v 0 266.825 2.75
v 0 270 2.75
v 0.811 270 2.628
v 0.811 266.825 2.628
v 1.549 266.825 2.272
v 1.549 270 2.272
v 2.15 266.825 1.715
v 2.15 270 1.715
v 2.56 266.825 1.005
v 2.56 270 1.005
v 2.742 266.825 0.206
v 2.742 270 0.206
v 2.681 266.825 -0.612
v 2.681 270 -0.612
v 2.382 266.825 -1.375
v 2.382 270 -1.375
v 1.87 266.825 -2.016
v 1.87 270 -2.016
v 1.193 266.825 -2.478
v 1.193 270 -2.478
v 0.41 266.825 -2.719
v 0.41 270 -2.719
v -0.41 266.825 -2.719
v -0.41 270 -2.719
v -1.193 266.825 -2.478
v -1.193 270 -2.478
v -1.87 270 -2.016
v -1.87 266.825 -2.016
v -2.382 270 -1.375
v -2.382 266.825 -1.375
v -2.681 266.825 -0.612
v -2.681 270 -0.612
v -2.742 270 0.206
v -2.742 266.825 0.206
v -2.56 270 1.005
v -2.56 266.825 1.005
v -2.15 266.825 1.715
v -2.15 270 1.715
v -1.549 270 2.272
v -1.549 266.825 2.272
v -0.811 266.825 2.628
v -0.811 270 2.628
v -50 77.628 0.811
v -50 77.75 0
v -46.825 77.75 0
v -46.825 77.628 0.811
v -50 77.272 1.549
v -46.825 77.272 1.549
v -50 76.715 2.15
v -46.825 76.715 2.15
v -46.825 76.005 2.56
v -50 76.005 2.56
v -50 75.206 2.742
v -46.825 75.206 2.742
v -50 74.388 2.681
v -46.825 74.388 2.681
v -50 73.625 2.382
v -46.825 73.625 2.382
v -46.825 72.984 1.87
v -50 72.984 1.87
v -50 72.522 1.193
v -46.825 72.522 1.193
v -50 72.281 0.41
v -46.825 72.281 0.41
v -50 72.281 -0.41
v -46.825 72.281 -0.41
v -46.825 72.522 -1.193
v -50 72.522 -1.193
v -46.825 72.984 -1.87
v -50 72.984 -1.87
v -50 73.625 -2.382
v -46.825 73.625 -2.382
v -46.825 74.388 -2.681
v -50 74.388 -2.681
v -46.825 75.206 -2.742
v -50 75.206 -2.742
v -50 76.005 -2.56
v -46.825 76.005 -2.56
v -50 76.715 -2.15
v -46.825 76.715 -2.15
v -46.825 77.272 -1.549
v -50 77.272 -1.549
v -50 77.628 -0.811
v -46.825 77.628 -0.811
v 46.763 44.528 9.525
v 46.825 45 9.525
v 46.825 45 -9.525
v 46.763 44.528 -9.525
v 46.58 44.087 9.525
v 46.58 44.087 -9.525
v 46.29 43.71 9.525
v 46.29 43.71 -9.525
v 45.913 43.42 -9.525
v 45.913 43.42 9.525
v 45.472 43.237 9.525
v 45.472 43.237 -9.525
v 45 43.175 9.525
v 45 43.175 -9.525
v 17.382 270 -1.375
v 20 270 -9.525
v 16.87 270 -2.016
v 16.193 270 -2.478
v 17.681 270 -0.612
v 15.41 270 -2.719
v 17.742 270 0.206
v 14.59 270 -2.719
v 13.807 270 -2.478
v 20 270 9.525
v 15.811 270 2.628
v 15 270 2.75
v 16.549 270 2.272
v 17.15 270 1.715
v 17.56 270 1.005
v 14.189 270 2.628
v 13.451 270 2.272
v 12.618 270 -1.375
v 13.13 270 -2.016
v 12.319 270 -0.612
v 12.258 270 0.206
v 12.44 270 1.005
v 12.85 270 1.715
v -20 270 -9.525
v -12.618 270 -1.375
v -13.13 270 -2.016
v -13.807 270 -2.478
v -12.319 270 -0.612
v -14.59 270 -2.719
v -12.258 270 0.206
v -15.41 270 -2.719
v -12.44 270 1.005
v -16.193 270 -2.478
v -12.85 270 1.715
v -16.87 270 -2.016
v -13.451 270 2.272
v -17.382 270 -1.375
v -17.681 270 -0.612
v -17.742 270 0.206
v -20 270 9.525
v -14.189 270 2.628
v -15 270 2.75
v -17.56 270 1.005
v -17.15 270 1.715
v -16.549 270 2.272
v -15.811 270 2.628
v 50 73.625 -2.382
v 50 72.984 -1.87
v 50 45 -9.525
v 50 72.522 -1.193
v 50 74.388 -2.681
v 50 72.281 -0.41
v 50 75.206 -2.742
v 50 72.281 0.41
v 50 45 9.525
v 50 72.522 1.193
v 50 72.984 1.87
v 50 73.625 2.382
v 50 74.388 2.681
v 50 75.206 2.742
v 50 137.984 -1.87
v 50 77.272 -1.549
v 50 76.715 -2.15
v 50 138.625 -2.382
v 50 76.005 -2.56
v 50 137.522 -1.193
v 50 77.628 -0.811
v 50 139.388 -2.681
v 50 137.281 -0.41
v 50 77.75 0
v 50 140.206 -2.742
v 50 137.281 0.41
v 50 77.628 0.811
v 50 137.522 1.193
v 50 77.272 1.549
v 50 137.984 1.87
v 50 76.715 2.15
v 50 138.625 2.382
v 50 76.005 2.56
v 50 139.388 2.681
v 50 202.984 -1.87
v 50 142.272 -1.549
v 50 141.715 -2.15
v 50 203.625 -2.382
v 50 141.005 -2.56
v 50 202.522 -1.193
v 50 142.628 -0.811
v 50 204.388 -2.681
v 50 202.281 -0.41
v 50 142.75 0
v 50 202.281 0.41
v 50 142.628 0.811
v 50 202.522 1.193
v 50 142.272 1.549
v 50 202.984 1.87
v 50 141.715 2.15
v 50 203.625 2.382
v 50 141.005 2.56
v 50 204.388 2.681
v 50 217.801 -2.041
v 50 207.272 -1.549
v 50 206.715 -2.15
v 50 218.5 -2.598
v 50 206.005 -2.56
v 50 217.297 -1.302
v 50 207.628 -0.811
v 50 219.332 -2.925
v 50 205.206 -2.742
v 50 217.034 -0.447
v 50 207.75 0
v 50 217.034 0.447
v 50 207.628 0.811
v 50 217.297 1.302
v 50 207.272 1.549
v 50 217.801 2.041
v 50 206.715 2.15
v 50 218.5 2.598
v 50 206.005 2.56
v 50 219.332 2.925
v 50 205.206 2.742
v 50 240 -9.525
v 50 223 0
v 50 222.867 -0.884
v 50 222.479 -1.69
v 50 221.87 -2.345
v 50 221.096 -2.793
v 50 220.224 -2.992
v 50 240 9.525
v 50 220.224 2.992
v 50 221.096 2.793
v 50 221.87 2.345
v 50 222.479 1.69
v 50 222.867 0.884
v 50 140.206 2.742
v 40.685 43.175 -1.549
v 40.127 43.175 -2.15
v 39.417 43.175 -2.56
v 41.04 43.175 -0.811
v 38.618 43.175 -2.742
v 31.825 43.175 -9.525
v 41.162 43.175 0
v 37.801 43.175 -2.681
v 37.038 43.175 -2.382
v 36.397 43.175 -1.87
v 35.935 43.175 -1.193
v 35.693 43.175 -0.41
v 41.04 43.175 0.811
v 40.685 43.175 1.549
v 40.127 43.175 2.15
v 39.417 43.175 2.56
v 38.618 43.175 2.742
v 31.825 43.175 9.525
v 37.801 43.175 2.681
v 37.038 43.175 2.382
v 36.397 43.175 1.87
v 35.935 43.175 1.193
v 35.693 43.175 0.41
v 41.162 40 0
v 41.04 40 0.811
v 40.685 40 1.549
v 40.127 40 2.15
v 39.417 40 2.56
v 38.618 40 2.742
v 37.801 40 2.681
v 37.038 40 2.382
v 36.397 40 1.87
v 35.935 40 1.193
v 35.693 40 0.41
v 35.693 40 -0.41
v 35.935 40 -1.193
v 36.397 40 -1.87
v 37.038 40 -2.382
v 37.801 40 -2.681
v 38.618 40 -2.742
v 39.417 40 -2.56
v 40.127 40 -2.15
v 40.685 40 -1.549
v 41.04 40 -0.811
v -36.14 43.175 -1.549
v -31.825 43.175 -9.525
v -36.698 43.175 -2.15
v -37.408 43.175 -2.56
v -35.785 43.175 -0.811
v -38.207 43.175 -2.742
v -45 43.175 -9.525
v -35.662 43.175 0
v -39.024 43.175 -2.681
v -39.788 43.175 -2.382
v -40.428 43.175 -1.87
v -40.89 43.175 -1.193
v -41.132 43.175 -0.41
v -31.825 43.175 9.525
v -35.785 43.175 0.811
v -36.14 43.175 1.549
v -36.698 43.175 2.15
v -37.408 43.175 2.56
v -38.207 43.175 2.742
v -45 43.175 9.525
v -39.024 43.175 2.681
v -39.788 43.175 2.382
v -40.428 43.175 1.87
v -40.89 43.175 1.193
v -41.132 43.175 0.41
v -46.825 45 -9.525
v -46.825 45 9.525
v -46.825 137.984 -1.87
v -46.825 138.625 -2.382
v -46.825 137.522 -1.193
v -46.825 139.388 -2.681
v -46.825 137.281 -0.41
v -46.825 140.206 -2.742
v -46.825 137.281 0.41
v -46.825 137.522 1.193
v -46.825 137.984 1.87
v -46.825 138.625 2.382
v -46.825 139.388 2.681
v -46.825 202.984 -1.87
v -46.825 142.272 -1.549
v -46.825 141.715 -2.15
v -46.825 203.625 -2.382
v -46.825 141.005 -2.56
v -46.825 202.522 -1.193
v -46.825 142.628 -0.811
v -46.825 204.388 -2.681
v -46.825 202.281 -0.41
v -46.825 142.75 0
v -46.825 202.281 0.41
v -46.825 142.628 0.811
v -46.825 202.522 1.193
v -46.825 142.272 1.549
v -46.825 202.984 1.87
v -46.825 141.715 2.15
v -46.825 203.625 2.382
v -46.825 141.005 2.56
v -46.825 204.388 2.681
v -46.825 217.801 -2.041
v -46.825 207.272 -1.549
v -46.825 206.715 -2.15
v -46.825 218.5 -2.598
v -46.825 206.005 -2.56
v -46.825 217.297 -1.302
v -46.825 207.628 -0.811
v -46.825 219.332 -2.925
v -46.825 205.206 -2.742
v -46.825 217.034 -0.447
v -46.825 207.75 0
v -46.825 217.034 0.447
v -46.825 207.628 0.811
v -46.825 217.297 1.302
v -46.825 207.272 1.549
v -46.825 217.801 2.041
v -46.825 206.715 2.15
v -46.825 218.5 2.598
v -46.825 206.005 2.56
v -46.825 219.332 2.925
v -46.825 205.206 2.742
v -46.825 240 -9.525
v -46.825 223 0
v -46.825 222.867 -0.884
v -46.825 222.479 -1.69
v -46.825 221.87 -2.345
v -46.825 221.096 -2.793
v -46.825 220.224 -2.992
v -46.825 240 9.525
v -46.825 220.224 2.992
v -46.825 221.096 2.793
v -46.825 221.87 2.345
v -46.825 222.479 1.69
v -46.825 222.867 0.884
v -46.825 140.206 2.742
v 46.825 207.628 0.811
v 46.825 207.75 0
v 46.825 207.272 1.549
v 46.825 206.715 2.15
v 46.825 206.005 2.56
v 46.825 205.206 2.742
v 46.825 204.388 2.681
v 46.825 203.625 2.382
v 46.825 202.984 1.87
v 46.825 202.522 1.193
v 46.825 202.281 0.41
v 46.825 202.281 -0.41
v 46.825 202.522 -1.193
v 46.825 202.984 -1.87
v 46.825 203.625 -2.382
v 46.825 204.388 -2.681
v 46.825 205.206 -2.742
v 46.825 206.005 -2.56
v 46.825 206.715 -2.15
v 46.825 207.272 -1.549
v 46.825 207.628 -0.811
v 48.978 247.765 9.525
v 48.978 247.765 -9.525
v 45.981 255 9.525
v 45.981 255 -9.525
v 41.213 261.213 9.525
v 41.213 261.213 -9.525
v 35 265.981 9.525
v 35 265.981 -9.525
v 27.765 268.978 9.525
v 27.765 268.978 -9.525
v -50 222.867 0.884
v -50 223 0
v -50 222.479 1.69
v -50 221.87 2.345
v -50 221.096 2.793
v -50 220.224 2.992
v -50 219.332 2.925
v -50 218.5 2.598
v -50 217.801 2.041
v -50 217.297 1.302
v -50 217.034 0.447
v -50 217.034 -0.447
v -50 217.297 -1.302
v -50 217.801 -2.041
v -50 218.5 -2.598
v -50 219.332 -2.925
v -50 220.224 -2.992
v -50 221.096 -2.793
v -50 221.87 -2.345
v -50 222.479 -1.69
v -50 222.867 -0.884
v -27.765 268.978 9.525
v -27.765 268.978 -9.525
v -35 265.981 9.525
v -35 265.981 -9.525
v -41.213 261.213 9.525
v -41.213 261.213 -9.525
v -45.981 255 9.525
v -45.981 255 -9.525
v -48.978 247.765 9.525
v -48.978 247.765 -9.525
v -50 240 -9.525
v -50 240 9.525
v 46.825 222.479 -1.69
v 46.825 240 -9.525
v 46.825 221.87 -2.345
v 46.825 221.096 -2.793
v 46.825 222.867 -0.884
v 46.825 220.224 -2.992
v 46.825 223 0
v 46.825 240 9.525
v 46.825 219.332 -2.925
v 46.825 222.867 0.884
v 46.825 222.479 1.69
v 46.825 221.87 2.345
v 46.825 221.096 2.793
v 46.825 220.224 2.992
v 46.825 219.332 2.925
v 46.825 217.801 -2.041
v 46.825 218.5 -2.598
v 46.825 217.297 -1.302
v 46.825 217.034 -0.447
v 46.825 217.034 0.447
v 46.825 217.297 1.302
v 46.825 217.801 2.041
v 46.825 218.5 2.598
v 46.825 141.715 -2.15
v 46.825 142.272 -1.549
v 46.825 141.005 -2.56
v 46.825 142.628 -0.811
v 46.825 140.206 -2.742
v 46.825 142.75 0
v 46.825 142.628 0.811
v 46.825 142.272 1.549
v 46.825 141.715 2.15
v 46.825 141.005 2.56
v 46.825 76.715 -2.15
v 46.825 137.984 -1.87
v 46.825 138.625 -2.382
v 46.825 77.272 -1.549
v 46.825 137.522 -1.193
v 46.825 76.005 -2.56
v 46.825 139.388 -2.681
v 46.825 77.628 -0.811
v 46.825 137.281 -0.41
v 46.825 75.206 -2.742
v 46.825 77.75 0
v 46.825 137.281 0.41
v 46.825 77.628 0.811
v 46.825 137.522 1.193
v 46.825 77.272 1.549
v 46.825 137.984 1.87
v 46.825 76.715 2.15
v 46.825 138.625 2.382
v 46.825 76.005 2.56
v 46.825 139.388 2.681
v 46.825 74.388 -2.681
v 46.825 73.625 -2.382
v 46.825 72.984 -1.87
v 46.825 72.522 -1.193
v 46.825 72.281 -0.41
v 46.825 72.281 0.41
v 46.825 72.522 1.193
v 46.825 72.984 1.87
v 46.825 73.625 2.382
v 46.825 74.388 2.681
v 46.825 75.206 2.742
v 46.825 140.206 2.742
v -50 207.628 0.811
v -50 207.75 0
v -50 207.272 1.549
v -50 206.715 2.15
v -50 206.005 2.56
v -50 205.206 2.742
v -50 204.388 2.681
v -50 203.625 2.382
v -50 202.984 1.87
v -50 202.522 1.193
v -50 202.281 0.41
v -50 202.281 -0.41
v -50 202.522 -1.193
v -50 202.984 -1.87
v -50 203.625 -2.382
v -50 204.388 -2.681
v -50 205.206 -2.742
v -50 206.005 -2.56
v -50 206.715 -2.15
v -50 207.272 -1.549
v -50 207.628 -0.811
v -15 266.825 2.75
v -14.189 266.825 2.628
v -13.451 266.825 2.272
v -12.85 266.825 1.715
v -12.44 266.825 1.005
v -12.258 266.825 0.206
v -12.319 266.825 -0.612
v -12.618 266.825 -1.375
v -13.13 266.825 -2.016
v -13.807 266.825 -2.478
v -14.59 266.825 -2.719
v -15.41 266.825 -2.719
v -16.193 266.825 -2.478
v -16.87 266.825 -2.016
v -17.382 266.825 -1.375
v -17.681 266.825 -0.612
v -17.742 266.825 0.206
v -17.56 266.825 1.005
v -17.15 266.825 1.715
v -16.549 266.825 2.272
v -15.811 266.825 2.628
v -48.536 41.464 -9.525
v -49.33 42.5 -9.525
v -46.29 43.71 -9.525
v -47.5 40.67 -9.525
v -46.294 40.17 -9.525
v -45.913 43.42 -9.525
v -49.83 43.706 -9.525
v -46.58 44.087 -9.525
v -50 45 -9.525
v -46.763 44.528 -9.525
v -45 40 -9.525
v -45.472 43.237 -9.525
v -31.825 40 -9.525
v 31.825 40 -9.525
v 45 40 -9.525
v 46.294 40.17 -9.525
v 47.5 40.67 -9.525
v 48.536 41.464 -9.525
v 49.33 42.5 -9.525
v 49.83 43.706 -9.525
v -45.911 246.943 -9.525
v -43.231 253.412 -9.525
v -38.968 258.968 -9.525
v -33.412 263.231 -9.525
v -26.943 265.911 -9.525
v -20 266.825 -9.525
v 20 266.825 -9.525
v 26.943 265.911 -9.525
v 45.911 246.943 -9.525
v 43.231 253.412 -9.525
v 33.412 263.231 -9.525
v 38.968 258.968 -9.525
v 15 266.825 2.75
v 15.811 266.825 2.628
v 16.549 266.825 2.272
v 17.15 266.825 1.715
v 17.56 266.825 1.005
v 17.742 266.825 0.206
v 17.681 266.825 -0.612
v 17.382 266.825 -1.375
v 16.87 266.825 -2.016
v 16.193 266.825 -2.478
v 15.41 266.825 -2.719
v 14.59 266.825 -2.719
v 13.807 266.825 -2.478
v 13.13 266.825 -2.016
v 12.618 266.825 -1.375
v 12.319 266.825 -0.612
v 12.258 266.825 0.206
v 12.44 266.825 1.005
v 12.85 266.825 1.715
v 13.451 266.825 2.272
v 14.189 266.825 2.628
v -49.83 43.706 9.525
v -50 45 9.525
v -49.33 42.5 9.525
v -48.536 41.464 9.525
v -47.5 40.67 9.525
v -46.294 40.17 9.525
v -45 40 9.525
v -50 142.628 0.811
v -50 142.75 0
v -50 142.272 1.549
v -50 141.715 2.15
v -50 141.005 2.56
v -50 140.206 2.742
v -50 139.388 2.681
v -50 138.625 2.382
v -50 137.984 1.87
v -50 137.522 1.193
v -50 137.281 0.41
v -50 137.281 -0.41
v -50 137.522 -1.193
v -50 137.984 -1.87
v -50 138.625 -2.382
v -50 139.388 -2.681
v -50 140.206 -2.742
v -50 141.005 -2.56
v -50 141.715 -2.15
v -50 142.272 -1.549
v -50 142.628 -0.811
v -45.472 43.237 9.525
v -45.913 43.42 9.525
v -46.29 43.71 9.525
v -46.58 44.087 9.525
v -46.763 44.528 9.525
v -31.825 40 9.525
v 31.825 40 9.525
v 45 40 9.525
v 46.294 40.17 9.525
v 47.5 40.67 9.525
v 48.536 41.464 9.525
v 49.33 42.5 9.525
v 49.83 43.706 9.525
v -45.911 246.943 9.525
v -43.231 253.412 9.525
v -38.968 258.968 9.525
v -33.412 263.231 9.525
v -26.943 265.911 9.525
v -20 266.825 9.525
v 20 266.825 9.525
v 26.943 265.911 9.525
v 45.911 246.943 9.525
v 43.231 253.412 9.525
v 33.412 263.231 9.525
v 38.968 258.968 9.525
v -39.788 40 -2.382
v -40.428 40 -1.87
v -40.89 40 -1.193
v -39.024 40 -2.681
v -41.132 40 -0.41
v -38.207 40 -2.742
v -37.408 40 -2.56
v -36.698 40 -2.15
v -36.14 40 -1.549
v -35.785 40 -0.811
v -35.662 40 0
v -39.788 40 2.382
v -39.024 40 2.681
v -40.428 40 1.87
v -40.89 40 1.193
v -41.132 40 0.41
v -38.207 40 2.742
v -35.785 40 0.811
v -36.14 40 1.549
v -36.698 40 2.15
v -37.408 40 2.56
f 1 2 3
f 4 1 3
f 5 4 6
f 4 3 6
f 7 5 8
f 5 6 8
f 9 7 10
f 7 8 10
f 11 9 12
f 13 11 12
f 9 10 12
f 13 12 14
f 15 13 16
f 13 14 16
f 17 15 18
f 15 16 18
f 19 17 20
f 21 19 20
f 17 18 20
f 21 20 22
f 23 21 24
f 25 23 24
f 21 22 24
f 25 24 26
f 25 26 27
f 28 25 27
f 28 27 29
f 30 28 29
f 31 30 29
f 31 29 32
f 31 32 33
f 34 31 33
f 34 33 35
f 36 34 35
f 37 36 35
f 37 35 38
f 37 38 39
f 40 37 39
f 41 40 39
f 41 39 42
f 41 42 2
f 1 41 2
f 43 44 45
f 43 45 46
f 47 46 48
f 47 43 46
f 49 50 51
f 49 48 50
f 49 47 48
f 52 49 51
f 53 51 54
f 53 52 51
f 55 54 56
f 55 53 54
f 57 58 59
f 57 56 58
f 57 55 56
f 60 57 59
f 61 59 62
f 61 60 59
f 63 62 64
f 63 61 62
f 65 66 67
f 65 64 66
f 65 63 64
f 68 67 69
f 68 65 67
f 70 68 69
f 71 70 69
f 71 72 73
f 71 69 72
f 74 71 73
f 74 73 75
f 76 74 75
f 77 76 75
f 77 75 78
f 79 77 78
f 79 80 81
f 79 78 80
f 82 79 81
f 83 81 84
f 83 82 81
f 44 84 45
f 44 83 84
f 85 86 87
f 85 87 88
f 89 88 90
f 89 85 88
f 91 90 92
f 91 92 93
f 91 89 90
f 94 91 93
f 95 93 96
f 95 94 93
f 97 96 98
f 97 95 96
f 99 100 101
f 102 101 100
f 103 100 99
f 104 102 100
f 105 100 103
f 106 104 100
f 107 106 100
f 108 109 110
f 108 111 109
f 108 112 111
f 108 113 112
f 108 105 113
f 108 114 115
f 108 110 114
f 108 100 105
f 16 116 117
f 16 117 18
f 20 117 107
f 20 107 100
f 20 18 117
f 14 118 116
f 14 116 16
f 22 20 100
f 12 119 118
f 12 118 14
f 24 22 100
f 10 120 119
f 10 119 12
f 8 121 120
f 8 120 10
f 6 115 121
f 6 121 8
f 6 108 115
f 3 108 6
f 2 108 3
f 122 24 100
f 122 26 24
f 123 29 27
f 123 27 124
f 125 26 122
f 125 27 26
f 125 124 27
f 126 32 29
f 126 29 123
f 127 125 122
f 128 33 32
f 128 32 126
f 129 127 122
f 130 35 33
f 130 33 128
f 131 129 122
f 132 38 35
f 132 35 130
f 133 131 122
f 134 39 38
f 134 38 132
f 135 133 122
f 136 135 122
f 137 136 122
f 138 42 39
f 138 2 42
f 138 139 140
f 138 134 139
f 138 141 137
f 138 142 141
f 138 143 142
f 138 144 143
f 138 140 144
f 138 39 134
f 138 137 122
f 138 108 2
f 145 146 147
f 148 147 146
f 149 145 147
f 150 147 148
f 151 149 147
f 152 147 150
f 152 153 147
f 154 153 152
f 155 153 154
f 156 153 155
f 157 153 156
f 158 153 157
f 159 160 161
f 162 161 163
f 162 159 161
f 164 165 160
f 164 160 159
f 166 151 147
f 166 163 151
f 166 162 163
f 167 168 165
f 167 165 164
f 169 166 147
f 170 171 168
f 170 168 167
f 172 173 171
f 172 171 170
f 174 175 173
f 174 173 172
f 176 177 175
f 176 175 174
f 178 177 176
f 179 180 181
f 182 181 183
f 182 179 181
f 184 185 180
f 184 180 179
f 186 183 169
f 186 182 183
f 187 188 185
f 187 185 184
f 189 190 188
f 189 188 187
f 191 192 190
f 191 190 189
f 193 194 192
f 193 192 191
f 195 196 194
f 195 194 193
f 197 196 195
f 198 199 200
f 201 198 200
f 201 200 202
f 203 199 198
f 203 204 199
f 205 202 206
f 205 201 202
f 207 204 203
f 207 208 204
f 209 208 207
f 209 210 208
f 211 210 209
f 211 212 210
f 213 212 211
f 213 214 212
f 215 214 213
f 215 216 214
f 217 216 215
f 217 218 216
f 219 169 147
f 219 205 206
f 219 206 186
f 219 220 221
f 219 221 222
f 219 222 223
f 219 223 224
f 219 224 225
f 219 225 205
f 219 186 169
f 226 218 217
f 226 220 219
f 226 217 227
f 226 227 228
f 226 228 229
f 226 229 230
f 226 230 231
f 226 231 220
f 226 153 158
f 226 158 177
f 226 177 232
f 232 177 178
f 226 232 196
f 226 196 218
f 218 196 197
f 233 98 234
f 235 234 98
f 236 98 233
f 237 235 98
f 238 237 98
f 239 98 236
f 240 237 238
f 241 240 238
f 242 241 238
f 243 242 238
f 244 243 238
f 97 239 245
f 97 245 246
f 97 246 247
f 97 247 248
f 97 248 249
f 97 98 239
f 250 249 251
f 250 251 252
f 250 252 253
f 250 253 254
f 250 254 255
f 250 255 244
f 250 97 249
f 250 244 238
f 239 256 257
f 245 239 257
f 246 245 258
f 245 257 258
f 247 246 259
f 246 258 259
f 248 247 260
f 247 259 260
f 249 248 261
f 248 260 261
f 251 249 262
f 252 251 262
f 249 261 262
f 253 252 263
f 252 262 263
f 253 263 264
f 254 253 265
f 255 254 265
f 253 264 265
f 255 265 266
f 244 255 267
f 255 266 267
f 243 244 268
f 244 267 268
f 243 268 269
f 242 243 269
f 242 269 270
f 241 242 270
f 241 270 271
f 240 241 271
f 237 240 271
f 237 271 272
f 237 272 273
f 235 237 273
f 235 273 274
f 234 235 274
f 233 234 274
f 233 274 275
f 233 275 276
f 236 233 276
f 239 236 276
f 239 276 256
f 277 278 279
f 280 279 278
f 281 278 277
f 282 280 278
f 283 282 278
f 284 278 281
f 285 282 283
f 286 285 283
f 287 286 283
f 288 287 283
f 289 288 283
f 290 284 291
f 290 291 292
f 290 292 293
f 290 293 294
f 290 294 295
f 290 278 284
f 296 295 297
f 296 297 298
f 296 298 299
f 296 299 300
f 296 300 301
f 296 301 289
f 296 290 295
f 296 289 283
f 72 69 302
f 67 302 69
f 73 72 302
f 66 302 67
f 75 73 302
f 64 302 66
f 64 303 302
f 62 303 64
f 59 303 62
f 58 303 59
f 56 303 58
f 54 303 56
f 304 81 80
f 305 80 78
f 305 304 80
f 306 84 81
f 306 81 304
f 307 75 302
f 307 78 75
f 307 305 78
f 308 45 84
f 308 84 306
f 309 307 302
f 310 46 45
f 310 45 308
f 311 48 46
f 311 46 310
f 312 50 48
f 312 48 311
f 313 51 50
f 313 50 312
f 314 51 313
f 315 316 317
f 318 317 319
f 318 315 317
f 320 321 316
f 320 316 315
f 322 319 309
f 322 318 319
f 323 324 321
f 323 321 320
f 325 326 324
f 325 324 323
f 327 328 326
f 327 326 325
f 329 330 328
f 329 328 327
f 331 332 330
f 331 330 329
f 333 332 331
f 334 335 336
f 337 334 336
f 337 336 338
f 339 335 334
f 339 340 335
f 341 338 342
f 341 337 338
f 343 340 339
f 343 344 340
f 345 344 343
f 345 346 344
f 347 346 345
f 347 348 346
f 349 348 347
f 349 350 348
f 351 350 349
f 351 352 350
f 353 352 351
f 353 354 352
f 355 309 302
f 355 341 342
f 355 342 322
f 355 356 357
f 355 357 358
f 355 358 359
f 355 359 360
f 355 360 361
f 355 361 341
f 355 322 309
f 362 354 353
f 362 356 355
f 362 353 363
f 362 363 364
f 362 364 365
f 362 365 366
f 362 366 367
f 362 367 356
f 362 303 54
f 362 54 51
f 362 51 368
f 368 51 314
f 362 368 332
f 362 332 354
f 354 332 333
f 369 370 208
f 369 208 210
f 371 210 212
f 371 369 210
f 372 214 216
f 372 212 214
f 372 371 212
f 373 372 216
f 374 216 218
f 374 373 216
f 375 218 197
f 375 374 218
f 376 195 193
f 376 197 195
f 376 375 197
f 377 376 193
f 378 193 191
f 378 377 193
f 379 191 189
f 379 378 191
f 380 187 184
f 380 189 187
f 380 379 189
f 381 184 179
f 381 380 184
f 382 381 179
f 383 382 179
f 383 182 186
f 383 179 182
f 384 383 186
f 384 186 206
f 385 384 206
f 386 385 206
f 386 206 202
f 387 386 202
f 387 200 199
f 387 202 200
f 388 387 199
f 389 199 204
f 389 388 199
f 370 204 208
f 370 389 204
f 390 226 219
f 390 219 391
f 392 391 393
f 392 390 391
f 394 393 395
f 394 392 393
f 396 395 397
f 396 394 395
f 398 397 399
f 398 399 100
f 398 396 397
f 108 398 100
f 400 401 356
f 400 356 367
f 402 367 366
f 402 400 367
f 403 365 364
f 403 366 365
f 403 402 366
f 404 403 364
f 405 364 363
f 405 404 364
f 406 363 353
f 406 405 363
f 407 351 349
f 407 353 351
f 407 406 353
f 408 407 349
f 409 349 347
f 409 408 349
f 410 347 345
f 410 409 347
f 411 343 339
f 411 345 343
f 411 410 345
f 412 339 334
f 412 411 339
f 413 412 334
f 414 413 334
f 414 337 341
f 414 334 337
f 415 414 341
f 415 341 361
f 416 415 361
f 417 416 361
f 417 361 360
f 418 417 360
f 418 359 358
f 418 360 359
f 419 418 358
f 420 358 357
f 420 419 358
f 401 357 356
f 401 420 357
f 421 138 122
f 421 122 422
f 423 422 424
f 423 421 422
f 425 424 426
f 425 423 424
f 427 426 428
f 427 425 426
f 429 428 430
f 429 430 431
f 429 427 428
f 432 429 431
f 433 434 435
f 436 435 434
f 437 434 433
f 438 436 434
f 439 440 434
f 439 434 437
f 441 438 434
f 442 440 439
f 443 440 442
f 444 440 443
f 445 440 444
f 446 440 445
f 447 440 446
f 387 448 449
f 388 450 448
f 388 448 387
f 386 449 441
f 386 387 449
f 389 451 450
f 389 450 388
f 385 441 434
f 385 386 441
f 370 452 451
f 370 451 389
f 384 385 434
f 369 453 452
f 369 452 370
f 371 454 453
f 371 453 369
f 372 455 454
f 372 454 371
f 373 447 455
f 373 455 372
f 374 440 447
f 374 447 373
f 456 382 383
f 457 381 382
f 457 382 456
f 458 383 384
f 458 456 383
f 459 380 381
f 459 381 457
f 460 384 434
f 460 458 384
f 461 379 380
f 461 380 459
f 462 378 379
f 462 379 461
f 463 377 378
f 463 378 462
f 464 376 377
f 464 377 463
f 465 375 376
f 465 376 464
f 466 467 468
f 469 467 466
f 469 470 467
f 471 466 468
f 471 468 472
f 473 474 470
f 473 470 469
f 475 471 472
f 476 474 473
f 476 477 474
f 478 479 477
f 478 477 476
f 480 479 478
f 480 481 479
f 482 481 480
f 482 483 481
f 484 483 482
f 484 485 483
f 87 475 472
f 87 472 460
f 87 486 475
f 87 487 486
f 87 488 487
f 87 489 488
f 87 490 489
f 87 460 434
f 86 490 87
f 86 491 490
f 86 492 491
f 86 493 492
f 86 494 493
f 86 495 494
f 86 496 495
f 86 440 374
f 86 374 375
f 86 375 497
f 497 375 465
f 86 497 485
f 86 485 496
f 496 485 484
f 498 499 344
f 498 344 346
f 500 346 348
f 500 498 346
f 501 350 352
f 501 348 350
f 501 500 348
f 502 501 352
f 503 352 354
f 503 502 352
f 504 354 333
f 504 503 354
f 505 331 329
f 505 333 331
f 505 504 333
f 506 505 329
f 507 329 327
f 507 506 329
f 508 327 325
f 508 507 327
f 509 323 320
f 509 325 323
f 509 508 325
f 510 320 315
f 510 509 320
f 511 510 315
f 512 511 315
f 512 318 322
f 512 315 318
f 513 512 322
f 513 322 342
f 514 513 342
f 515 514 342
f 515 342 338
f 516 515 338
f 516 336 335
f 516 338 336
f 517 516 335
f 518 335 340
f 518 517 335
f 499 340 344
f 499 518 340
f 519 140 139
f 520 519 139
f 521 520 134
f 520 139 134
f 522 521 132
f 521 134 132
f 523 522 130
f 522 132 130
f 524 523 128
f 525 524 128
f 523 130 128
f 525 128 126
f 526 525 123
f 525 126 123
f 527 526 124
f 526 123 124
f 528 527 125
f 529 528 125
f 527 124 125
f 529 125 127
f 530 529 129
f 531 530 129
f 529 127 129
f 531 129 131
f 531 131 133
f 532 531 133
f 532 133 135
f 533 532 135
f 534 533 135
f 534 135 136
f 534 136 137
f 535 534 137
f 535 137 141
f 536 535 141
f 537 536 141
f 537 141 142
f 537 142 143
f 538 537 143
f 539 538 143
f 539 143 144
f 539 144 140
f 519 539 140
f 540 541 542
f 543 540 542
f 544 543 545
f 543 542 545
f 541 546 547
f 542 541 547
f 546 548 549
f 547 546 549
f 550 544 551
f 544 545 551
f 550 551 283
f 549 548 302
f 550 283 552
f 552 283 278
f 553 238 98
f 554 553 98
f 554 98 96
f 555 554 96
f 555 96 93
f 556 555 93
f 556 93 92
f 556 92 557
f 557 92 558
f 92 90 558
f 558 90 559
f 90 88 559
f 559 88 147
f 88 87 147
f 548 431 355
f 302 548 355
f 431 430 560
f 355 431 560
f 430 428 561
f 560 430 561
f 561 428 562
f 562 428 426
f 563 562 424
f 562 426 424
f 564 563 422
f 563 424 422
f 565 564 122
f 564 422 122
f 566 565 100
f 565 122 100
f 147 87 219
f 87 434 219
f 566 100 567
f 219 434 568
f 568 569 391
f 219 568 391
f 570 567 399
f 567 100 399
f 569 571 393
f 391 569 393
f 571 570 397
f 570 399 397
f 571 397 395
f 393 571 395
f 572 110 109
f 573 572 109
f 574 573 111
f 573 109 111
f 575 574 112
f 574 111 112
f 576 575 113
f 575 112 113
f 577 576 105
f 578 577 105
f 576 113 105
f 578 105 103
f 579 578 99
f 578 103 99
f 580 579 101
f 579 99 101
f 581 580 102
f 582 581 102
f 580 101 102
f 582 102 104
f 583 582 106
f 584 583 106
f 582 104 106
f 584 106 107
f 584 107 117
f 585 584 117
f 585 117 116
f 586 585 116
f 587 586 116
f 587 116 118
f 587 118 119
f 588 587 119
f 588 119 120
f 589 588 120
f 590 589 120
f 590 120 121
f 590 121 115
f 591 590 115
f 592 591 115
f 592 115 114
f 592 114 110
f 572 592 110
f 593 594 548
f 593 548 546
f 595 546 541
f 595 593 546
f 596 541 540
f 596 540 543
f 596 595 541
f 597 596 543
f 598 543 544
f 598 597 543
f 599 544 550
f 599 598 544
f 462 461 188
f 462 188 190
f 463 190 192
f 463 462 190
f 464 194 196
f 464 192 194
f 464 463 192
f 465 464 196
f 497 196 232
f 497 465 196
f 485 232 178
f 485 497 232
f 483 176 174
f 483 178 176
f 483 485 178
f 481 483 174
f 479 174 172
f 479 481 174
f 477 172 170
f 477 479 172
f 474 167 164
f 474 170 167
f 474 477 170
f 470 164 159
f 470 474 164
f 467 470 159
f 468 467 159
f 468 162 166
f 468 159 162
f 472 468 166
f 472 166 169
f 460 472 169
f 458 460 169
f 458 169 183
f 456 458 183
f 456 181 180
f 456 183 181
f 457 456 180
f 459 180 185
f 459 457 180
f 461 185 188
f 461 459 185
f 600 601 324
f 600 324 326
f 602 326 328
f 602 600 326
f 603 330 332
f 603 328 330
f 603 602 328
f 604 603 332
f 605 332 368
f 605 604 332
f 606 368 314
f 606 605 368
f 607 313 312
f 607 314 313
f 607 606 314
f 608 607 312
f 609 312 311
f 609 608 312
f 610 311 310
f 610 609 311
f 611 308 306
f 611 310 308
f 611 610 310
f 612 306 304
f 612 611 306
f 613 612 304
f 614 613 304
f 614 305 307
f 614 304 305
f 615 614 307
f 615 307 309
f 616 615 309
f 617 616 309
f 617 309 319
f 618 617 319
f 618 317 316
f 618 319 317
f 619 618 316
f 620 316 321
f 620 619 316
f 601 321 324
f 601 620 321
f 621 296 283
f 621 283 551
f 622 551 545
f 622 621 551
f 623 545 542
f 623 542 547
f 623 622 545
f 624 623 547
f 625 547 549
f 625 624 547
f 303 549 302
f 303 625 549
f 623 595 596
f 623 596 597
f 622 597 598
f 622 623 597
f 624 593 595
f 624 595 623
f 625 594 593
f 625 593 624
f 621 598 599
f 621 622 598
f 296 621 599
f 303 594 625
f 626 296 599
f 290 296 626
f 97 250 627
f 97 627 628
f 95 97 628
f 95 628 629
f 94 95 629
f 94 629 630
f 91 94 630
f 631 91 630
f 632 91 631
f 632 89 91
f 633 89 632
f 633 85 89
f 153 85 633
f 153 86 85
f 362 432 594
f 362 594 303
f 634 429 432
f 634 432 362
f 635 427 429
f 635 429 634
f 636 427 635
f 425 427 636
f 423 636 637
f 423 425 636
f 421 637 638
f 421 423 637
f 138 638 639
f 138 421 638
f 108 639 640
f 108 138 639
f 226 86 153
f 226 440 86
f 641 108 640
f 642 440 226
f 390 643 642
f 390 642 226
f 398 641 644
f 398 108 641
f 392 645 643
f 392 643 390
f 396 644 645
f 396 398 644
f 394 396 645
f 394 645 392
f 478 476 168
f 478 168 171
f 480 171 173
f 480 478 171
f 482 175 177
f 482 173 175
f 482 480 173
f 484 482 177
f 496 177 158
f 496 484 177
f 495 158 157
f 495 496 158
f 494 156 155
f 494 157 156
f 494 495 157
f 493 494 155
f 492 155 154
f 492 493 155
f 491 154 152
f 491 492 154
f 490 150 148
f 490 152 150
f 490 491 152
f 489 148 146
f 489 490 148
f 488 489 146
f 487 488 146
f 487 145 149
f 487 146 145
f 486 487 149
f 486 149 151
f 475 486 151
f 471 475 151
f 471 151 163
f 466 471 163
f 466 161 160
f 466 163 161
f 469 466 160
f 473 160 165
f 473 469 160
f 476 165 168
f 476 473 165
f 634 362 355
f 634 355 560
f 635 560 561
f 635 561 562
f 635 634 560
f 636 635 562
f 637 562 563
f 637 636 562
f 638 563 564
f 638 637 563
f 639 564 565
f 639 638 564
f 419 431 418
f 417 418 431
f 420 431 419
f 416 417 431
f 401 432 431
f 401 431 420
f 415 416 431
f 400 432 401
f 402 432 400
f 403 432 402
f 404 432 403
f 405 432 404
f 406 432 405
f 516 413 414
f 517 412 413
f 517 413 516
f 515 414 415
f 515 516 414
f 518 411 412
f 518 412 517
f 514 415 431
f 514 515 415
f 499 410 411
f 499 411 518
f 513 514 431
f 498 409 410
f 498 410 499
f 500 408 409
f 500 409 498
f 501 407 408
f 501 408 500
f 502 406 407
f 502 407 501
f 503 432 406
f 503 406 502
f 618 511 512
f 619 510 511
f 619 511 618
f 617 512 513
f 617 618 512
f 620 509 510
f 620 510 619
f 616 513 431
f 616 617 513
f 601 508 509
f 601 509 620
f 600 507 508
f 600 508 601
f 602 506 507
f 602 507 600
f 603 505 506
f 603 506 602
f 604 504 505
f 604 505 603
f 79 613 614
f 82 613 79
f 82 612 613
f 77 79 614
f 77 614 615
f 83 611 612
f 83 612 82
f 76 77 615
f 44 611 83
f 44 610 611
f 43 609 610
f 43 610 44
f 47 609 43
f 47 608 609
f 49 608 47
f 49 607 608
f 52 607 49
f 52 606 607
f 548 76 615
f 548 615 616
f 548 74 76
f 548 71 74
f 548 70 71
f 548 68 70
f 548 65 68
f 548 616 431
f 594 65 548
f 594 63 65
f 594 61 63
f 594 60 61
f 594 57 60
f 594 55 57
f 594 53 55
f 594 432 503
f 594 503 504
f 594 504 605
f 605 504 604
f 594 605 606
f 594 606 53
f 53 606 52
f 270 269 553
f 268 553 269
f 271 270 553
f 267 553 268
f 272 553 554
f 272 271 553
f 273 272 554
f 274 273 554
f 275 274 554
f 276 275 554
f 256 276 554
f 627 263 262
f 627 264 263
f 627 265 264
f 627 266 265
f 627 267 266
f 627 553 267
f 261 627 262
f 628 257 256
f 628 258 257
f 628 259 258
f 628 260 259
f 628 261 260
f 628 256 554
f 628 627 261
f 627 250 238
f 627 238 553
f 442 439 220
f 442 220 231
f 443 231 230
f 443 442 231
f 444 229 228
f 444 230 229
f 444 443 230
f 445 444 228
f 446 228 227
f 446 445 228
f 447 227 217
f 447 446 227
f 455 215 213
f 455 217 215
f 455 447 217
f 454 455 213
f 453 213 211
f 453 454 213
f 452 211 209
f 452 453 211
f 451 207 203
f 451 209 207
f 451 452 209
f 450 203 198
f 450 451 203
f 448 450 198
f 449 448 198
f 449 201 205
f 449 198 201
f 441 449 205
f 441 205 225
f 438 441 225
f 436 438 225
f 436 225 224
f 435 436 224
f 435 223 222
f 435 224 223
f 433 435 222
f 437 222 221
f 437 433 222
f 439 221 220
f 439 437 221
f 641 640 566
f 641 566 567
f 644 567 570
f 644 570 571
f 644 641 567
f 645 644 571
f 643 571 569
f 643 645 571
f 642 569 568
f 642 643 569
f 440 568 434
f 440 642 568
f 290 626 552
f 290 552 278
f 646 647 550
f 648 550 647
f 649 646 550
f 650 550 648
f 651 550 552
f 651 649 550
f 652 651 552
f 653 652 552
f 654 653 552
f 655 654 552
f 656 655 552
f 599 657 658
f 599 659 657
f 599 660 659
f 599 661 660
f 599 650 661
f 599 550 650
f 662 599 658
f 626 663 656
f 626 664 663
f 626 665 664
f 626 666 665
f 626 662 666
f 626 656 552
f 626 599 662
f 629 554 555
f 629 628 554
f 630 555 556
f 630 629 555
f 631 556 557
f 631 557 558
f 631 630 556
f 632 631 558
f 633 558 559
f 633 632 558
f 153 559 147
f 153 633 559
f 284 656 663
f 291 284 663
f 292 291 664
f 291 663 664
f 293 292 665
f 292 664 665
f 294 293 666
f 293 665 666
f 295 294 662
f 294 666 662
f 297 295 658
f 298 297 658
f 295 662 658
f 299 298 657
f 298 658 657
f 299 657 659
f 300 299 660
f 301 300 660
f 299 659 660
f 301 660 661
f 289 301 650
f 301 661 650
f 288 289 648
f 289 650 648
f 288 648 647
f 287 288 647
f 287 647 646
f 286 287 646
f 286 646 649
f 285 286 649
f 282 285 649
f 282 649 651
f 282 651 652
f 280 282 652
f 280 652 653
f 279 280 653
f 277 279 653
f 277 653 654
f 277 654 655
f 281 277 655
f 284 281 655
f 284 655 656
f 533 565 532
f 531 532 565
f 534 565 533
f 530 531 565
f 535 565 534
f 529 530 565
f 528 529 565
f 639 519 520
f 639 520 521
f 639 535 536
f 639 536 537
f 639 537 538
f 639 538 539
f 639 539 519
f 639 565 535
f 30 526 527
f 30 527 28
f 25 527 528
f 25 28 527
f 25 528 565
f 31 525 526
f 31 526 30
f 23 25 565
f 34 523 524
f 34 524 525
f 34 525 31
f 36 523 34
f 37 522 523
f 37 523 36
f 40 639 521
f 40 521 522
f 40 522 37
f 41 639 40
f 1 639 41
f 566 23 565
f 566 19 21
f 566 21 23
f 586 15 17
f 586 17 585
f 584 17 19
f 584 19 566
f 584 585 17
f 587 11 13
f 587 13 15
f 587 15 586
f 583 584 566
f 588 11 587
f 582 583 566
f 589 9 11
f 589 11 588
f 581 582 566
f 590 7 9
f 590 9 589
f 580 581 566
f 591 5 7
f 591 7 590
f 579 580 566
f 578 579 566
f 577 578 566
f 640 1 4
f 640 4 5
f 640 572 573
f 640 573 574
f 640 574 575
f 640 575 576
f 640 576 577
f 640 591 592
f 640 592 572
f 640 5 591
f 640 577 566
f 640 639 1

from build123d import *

# Parameters (mm, degrees)
BOSS_EXTRUDE1_DEPTH     = 9.525
SKETCH12_R              = 2.75
CUT_EXTRUDE2_DEPTH      = 236.564695201
CUT_EXTRUDE3_DEPTH      = 289.081109455
CUT_EXTRUDE3_DEPTH_BACK = 289.081109455
SKETCH13_R              = 2.75
CUT_EXTRUDE6_REACH      = 237.565
SKETCH16_R              = 2.75
CUT_EXTRUDE7_DEPTH      = 289.081109455
CUT_EXTRUDE7_DEPTH_BACK = 289.081109455
SKETCH17_R              = 3


with BuildPart() as part:
    # Sketch1 → Boss-Extrude1 (new, symmetric)
    with BuildSketch(Plane.XY):
        with BuildLine():
            Line((50, 45), (50, 240))
            ThreePointArc((50, 240), (41.213203436, 261.213203436), (20, 270))
            Line((20, 270), (-20, 270))
            ThreePointArc((-20, 270), (-41.213203436, 261.213203436), (-50, 240))
            Line((-50, 240), (-50, 45))
            ThreePointArc((-50, 45), (-48.535533906, 41.464466094), (-45, 40))
            Line((-45, 40), (-31.825, 40))
            Line((-31.825, 40), (-31.825, 43.175))
            Line((-31.825, 43.175), (-45, 43.175))
            ThreePointArc((-45, 43.175), (-46.290469876, 43.709530124), (-46.825, 45))
            Line((-46.825, 45), (-46.825, 240))
            ThreePointArc((-46.825, 240), (-38.968139405, 258.968139405), (-20, 266.825))
            Line((-20, 266.825), (20, 266.825))
            ThreePointArc((20, 266.825), (38.968139405, 258.968139405), (46.825, 240))
            Line((46.825, 240), (46.825, 45))
            ThreePointArc((46.825, 45), (46.290469876, 43.709530124), (45, 43.175))
            Line((45, 43.175), (31.825, 43.175))
            Line((31.825, 43.175), (31.825, 40))
            Line((31.825, 40), (45, 40))
            ThreePointArc((45, 40), (48.535533906, 41.464466094), (50, 45))
        make_face()
    extrude(amount=BOSS_EXTRUDE1_DEPTH, both=True)

    # Sketch12 → Cut-Extrude2 (cut, through all)
    with BuildSketch(Plane(origin=(0, 270, 0), x_dir=(1, 0, 0), z_dir=(0, 1, 0))):
        with Locations(Location((0, 0, 0), (0, 0, 270))):
            Circle(SKETCH12_R)
        with Locations(Location((-15, 0, 0), (0, 0, 270))):
            Circle(SKETCH12_R)
        with Locations(Location((15, 0, 0), (0, 0, 270))):
            Circle(SKETCH12_R)
    extrude(amount=-CUT_EXTRUDE2_DEPTH, mode=Mode.SUBTRACT)

    # Sketch13 → Cut-Extrude3 (cut, two sides: drawn at the far end of the back side and taken through both)
    with BuildSketch(Plane(origin=(50, 0, 0), x_dir=(0, 0, -1), z_dir=(1, 0, 0)).offset(-CUT_EXTRUDE3_DEPTH_BACK)):
        with Locations(Location((0, 205, 0), (0, 0, 90))):
            Circle(SKETCH13_R)
        with Locations(Location((0, 140, 0), (0, 0, 90))):
            Circle(SKETCH13_R)
        with Locations(Location((0, 75, 0), (0, 0, 90))):
            Circle(SKETCH13_R)
    extrude(amount=CUT_EXTRUDE3_DEPTH + CUT_EXTRUDE3_DEPTH_BACK, mode=Mode.SUBTRACT)

    # Sketch16 → Cut-Extrude6 (cut, up to next)
    with BuildSketch(Plane(origin=(0, 40, 0), x_dir=(-1, 0, 0), z_dir=(0, -1, 0)), mode=Mode.PRIVATE) as cut_extrude6_sk1:
        with Locations(Location((38.4125, 0, 0), (0, 0, 180))):
            Circle(SKETCH16_R)
    cut_extrude6_tool1 = extrude(cut_extrude6_sk1.sketch, amount=-CUT_EXTRUDE6_REACH, mode=Mode.PRIVATE) & part.part
    # Sketch16 → Cut-Extrude6 (cut, up to next)
    with BuildSketch(Plane(origin=(0, 40, 0), x_dir=(-1, 0, 0), z_dir=(0, -1, 0)), mode=Mode.PRIVATE) as cut_extrude6_sk2:
        with Locations(Location((-38.4125, 0, 0), (0, 0, 180))):
            Circle(SKETCH16_R)
    cut_extrude6_tool2 = extrude(cut_extrude6_sk2.sketch, amount=-CUT_EXTRUDE6_REACH, mode=Mode.PRIVATE) & part.part
    add(cut_extrude6_tool1.solids().sort_by_distance((-38.4125, 40, 0))[0], mode=Mode.SUBTRACT)
    add(cut_extrude6_tool2.solids().sort_by_distance((38.4125, 40, 0))[0], mode=Mode.SUBTRACT)

    # Sketch17 → Cut-Extrude7 (cut, two sides: drawn at the far end of the back side and taken through both)
    with BuildSketch(Plane(origin=(50, 0, 0), x_dir=(0, 0, -1), z_dir=(1, 0, 0)).offset(-CUT_EXTRUDE7_DEPTH_BACK)):
        with Locations(Location((0, 220, 0), (0, 0, 90))):
            Circle(SKETCH17_R)
    extrude(amount=CUT_EXTRUDE7_DEPTH + CUT_EXTRUDE7_DEPTH_BACK, mode=Mode.SUBTRACT)


solid = part.part
